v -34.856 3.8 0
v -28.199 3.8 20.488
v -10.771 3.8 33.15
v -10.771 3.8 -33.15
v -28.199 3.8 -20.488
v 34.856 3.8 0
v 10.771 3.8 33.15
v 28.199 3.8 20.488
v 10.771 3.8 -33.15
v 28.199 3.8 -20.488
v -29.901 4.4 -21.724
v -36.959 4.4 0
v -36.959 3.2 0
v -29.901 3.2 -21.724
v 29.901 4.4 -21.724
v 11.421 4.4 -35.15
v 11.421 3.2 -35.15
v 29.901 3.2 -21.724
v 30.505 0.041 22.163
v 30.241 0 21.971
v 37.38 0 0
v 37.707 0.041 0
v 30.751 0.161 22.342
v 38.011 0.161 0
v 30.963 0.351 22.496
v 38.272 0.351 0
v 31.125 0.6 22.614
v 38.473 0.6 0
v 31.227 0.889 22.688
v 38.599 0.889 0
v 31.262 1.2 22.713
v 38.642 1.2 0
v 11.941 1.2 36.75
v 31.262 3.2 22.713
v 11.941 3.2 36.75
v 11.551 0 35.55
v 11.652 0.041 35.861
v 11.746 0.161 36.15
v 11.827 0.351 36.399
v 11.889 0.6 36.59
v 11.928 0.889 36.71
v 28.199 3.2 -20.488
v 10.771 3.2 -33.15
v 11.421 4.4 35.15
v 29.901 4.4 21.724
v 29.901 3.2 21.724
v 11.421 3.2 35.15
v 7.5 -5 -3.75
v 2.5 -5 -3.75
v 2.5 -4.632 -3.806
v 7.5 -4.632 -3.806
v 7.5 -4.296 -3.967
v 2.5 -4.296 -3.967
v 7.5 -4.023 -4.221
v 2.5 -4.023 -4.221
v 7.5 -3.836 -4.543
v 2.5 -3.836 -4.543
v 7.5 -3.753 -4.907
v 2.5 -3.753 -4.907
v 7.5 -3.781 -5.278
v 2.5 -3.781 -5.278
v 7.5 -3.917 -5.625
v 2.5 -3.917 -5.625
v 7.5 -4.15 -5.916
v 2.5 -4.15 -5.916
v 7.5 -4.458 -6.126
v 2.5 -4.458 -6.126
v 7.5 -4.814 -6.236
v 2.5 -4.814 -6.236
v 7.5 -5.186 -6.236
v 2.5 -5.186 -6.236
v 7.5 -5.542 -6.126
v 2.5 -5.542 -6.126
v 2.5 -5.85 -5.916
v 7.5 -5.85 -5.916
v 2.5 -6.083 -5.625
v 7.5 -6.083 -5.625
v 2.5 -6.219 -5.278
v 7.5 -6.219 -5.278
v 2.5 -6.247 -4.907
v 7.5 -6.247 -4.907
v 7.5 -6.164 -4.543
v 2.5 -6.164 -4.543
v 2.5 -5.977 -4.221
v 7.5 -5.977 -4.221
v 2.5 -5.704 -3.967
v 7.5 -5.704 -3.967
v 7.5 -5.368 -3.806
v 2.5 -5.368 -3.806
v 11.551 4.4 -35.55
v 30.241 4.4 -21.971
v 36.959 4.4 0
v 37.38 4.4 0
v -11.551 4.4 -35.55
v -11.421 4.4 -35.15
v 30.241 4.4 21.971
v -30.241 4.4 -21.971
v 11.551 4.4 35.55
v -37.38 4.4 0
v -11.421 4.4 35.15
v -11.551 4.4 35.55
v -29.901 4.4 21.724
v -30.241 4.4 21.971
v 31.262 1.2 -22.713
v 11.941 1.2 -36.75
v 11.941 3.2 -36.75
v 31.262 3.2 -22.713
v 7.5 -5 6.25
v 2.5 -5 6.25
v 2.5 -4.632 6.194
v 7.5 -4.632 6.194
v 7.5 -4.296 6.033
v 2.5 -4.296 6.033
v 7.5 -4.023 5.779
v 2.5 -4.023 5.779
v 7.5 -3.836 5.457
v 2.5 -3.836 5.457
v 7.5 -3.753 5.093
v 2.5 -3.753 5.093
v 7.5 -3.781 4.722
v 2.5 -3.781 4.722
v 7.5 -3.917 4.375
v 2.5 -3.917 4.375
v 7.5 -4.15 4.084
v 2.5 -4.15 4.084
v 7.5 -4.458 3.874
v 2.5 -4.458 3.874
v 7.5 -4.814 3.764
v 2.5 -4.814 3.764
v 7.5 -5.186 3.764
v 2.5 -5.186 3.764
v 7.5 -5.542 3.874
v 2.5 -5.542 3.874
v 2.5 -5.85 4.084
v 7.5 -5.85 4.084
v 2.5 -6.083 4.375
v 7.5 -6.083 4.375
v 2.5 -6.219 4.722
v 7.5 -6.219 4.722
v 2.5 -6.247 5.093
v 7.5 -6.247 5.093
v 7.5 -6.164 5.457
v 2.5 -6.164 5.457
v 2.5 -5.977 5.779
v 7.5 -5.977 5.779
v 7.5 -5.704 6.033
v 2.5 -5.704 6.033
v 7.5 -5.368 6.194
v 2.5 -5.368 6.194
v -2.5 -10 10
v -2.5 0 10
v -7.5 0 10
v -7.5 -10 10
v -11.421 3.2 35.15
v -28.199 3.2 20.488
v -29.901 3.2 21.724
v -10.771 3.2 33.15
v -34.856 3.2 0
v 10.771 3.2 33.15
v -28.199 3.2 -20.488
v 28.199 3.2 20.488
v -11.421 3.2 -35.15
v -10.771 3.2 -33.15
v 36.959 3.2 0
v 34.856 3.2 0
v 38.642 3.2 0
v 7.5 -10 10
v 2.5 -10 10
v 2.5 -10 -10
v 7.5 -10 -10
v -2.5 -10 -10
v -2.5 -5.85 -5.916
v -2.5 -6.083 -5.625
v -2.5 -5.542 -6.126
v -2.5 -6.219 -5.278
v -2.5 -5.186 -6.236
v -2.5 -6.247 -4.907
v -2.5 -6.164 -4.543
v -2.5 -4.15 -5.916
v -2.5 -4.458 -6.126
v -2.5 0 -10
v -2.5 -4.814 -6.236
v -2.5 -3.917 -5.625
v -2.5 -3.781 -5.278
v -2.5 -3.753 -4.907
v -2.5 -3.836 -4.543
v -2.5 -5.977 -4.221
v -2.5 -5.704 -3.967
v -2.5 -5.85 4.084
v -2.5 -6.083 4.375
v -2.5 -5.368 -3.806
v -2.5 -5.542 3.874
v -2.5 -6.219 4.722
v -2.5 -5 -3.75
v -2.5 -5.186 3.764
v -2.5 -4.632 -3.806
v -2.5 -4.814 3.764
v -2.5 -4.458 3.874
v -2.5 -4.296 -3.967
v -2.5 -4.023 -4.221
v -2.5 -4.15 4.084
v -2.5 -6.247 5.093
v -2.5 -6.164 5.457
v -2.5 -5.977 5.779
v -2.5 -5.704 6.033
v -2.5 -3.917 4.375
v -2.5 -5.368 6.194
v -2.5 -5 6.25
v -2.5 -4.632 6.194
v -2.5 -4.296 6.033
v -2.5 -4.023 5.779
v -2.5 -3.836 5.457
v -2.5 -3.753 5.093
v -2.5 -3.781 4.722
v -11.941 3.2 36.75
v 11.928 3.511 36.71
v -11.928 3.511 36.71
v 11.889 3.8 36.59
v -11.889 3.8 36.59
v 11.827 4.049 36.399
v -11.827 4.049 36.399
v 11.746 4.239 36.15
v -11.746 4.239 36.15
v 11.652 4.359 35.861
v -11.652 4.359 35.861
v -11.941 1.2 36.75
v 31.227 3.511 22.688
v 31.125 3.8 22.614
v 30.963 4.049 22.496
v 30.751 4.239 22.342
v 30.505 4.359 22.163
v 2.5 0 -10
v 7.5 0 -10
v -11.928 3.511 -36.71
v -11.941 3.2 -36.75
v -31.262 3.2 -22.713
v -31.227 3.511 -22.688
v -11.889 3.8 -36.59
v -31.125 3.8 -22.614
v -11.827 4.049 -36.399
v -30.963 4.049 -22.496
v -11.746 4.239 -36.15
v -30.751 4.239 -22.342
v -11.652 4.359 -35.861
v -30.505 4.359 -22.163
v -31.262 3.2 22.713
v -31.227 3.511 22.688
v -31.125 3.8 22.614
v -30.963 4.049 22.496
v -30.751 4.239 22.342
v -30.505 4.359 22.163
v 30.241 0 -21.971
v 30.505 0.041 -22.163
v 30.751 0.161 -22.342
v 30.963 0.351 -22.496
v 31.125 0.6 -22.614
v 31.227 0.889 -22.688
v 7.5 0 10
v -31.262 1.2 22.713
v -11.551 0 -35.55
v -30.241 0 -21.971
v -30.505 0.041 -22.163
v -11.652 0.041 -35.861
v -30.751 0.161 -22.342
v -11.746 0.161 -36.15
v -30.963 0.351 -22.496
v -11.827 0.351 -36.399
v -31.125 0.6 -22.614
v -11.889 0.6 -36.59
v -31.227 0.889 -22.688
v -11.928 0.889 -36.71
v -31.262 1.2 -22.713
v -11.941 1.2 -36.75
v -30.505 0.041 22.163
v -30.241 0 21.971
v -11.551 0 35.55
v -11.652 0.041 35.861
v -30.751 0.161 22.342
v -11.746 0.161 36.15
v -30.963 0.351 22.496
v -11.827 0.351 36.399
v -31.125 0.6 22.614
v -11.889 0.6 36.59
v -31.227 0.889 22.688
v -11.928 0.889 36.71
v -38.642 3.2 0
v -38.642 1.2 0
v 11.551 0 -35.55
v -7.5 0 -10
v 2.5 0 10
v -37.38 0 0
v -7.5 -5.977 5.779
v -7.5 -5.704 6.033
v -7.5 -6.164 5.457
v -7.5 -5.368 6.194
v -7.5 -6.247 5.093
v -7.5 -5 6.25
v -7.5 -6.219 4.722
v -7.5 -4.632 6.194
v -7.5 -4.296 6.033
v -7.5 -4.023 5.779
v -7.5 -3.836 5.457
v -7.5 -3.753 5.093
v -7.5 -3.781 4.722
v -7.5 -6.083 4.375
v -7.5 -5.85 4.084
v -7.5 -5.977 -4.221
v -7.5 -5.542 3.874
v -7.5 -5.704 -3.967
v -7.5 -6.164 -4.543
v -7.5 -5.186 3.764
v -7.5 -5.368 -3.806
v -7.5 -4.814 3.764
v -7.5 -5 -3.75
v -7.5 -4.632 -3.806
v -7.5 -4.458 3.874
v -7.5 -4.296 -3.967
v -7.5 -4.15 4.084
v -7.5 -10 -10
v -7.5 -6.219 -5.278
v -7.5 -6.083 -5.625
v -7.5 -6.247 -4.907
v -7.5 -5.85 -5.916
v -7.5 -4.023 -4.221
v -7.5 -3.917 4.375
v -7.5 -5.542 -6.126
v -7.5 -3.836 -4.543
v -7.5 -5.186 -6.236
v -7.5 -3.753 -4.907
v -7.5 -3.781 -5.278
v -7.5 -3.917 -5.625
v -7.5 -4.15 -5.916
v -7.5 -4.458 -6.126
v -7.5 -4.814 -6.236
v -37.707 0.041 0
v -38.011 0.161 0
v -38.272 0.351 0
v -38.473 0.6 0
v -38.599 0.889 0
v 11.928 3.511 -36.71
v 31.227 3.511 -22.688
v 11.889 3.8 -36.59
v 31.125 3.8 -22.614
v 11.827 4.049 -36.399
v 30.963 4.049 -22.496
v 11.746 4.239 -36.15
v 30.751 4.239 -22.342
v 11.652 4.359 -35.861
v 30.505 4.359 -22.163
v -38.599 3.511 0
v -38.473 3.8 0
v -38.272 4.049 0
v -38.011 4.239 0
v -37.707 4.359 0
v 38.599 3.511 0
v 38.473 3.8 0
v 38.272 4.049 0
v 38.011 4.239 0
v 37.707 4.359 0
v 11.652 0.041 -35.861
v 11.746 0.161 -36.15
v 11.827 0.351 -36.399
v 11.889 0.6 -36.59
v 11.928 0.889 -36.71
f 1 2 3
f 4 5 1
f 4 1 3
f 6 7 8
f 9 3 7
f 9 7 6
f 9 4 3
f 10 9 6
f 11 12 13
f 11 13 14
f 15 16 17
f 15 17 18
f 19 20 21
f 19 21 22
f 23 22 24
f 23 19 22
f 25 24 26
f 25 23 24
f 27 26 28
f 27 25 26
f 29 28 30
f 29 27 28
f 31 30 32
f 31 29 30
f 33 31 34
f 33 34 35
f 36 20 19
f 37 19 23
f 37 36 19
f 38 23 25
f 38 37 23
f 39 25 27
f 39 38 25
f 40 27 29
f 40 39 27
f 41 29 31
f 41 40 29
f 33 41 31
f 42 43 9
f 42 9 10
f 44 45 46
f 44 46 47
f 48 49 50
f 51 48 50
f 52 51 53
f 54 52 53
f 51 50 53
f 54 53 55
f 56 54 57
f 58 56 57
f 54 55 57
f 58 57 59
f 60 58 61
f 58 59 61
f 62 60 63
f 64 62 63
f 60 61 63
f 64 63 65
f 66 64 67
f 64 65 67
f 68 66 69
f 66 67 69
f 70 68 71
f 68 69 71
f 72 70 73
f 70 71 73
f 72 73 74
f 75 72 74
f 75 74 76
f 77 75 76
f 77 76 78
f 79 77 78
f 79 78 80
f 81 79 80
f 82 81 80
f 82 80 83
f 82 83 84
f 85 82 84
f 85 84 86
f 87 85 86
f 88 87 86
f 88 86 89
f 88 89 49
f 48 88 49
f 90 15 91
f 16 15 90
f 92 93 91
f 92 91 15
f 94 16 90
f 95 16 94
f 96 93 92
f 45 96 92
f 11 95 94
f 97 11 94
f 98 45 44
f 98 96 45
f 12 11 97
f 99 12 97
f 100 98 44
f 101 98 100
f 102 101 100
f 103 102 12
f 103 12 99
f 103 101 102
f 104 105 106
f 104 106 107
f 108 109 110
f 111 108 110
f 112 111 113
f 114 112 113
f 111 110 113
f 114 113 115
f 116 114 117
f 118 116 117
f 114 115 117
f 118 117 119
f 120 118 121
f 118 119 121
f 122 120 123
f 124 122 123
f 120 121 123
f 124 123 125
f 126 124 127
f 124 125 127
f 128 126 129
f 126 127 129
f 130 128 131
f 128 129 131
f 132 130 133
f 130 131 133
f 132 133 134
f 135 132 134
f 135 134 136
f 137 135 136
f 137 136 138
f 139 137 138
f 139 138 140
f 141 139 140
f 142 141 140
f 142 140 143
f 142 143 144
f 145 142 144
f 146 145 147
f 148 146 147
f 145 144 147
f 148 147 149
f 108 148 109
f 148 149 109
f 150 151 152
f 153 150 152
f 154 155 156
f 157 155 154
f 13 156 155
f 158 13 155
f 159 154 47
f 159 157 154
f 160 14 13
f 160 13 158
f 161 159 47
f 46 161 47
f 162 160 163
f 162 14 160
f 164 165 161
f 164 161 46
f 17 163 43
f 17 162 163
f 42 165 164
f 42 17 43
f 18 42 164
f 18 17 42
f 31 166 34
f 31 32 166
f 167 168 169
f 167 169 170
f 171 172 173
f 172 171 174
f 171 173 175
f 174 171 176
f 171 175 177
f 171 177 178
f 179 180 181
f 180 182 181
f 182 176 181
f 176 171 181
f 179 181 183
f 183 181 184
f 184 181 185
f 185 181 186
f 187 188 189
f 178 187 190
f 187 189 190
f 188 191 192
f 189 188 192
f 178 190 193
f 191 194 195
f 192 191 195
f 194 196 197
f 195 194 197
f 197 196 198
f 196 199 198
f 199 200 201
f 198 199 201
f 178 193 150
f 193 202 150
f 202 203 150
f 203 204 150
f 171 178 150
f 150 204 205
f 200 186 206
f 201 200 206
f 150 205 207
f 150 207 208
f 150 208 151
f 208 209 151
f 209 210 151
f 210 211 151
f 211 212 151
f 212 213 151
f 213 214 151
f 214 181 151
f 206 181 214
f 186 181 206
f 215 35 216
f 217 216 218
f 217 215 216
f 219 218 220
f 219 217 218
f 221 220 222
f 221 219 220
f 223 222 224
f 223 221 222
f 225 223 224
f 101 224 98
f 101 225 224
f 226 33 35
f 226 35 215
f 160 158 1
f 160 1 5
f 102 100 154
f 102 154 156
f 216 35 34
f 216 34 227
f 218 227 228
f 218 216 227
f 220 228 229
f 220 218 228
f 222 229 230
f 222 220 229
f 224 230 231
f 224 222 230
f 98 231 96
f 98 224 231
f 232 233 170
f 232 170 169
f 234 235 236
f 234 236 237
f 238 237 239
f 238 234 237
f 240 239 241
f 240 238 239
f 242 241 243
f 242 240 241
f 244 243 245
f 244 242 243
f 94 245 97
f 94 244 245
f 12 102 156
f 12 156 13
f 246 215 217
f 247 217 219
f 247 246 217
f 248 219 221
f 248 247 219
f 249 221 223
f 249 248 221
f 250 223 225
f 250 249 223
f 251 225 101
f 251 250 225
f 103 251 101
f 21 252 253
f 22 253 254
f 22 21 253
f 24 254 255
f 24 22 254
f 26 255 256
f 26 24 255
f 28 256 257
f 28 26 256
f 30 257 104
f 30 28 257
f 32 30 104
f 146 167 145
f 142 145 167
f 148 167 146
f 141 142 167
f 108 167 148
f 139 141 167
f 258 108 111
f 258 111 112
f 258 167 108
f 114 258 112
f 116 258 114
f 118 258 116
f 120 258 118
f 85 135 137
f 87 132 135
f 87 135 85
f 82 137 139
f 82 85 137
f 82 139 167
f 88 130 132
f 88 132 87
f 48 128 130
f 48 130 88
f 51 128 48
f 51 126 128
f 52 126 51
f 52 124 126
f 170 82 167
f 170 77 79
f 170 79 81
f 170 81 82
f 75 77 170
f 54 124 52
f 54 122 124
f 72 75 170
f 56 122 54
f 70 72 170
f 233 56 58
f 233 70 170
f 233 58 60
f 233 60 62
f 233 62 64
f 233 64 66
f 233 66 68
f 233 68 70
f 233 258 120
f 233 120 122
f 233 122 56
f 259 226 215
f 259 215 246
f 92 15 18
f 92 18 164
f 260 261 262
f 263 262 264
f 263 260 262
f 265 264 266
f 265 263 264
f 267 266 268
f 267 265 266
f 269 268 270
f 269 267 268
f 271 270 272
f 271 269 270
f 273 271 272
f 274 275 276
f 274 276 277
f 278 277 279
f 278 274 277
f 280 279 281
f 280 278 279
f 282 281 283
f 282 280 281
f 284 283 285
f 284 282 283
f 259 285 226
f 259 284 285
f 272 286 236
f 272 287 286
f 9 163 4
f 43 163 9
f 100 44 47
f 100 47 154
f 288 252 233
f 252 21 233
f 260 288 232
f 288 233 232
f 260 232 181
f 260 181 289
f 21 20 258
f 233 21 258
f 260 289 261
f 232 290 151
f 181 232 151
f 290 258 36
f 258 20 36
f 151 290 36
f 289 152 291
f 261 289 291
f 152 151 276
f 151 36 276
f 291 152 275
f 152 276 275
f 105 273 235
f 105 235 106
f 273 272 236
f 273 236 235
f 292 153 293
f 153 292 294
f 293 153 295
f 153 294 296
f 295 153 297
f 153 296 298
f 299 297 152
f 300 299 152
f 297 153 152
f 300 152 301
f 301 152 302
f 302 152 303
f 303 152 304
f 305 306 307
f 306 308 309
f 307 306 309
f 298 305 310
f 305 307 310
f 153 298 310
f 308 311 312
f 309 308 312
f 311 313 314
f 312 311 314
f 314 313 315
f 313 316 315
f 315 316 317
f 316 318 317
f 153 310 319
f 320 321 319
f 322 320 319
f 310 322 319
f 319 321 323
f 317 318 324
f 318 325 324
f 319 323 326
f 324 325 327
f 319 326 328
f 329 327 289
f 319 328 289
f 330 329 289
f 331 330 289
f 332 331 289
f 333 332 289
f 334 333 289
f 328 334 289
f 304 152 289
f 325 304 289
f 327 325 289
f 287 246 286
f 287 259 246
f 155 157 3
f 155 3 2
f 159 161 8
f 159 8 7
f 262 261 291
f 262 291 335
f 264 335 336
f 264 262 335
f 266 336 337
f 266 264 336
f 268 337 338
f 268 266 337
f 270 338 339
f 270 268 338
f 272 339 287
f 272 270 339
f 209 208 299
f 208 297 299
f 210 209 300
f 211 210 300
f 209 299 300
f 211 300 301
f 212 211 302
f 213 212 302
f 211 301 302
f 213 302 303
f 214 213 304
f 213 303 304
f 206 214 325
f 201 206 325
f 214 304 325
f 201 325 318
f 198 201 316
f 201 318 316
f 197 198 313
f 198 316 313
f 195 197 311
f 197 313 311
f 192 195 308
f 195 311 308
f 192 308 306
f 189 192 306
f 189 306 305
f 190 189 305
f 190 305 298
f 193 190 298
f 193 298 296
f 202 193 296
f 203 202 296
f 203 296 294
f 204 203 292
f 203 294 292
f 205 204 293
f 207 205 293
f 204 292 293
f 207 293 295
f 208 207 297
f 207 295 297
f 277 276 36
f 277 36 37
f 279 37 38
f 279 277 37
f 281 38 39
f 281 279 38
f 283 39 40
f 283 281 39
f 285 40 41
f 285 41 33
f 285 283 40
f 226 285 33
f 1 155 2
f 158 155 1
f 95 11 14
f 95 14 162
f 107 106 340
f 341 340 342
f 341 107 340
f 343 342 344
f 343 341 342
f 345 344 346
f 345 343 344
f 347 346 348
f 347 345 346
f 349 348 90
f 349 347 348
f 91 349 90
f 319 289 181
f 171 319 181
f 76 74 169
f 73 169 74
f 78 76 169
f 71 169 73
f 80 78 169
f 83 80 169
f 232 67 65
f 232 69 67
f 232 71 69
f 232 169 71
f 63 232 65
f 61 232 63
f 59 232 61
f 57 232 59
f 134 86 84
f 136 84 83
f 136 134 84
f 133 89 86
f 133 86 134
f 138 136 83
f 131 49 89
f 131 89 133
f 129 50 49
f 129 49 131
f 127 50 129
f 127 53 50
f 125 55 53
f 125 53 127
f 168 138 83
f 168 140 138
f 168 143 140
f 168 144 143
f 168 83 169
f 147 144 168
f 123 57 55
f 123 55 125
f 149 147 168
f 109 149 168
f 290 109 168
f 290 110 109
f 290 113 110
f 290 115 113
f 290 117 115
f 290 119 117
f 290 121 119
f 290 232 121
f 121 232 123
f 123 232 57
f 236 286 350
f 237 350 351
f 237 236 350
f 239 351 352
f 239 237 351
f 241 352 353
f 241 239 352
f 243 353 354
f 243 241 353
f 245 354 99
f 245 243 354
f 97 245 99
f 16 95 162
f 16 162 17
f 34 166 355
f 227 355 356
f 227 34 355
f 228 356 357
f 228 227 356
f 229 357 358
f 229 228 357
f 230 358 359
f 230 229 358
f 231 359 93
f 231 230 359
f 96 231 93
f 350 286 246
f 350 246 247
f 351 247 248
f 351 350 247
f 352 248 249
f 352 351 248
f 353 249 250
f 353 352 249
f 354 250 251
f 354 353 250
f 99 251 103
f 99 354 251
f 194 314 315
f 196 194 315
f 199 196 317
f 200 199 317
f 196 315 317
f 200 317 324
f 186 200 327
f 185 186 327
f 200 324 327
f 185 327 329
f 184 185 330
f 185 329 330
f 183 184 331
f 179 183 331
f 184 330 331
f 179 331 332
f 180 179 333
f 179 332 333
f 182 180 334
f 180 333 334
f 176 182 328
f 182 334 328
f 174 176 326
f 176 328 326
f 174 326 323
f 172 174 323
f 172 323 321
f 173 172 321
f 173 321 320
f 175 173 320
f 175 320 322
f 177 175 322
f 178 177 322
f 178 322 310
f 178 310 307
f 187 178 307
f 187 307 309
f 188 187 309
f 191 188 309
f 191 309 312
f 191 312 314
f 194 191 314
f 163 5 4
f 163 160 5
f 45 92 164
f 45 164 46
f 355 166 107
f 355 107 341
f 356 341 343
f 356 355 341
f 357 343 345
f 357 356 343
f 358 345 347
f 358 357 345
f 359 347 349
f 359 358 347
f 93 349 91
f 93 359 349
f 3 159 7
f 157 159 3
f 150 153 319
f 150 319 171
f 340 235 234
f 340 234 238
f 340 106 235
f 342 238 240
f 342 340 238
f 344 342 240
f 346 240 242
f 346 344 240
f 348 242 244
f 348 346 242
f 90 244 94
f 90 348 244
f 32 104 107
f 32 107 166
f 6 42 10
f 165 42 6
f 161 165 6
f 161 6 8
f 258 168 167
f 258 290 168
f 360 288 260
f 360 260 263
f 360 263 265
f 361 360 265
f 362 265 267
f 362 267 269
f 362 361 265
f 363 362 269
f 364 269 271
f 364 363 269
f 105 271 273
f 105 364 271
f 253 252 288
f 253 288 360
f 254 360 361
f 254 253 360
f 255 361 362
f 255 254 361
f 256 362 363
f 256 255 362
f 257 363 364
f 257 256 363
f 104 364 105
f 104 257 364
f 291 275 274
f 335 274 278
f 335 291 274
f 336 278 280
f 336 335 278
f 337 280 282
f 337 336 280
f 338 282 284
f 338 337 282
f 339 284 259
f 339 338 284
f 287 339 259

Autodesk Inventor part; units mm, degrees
ref_plane "YZ Plane" through (0, 0, 0) normal (1, 0, 0) x (0, 1, 0)
ref_plane "XZ Plane" through (0, 0, 0) normal (0, 1, 0) x (-1, 0, 0)
ref_plane "XY Plane" through (0, 0, 0) normal (0, 0, 1) x (1, 0, 0)
sketch "스케치1" plane through (0, 0, 0) normal (0, 1, 0) x (-1, 0, 0)
  line L0 (-10.9012, 33.5504) -> (10.9012, 33.5504)
  line L1 (10.9012, 33.5504) -> (28.5397, 20.7353)
  line L2 (28.5397, 20.7353) -> (35.277, 0)
  line L3 (35.277, 0) -> (28.5397, -20.7353)
  line L4 (28.5397, -20.7353) -> (10.9012, -33.5504)
  line L5 (10.9012, -33.5504) -> (-10.9012, -33.5504)
  line L6 (-10.9012, -33.5504) -> (-28.5397, -20.7353)
  line L7 (-28.5397, -20.7353) -> (-35.277, 0)
  line L8 (-35.277, 0) -> (-28.5397, 20.7353)
  line L9 (-28.5397, 20.7353) -> (-10.9012, 33.5504)
  line L10 (11.9409, -36.7504) -> (-11.9409, -36.7504)
  line L11 (-11.9409, -36.7504) -> (-31.2618, -22.713)
  line L12 (-31.2618, -22.713) -> (-38.6417, 0)
  line L13 (-38.6417, 0) -> (-31.2618, 22.713)
  line L14 (-31.2618, 22.713) -> (-11.9409, 36.7504)
  line L15 (-11.9409, 36.7504) -> (11.9409, 36.7504)
  line L16 (11.9409, 36.7504) -> (31.2618, 22.713)
  line L17 (31.2618, 22.713) -> (38.6417, 0)
  line L18 (38.6417, 0) -> (31.2618, -22.713)
  line L19 (31.2618, -22.713) -> (11.9409, -36.7504)
  point P0 (0, 0)
  point P1 (0, 0)
  point P2 (0, 0)
  dimension "d0" = 70.554
  dimension "d1" = 3.2
extrude "돌출1" add sketch "스케치1" along normal blind 4.4 contours L0 L1 L2 L3 L4 L5 L6 L7 L8 L9 | L10 L11 L12 L13 L14 L15 L16 L17 L18 L19
sketch "스케치2" plane through (0, 4.4, 0) normal (0, 1, 0) x (1, 0, 0)
  line L0 (-11.4211, 35.1504) -> (11.4211, 35.1504)
  line L1 (11.4211, 35.1504) -> (29.9007, 21.7242)
  line L2 (29.9007, 21.7242) -> (36.9593, 0)
  line L3 (36.9593, 0) -> (29.9007, -21.7242)
  line L4 (29.9007, -21.7242) -> (11.4211, -35.1504)
  line L5 (11.4211, -35.1504) -> (-11.4211, -35.1504)
  line L6 (-11.4211, -35.1504) -> (-29.9007, -21.7242)
  line L7 (-29.9007, -21.7242) -> (-36.9593, 0)
  line L8 (-36.9593, 0) -> (-29.9007, 21.7242)
  line L9 (-29.9007, 21.7242) -> (-11.4211, 35.1504)
  line L10 (-31.2618, 22.713) -> (-38.6417, 0) projected
  point P0 (0, 0)
  point P1 (0, 0)
  dimension "d4" = 1.6
extrude "돌출2" cut sketch "스케치2" against normal blind 1.2
sketch "스케치3" plane through (0, 3.2, 0) normal (0, 1, 0) x (1, 0, 0)
  line L0 (-10.7712, 33.1504) -> (10.7712, 33.1504)
  line L1 (10.7712, 33.1504) -> (28.1994, 20.4881)
  line L2 (28.1994, 20.4881) -> (34.8564, 0)
  line L3 (34.8564, 0) -> (28.1994, -20.4881)
  line L4 (28.1994, -20.4881) -> (10.7712, -33.1504)
  line L5 (10.7712, -33.1504) -> (-10.7712, -33.1504)
  line L6 (-10.7712, -33.1504) -> (-28.1994, -20.4881)
  line L7 (-28.1994, -20.4881) -> (-34.8564, 0)
  line L8 (-34.8564, 0) -> (-28.1994, 20.4881)
  line L9 (-28.1994, 20.4881) -> (-10.7712, 33.1504)
  line L10 (-29.9007, 21.7242) -> (-11.4211, 35.1504) projected
  point P0 (0, 0)
  point P1 (0, 0)
  dimension "d7" = 2
extrude "돌출3" add sketch "스케치3" along normal blind 0.6
fillet "모깎기1" radius 1.2 20 edges at (0, 4.4, 36.7504) (0, 0, 36.7504) (-21.6014, 4.4, 29.7317) (-21.6014, 0, 29.7317) (-34.9517, 4.4, 11.3565) (-34.9517, 4.4, -11.3565) (-21.6014, 4.4, -29.7317) (0, 4.4, -36.7504) (21.6014, 4.4, -29.7317) (34.9517, 4.4, -11.3565) (34.9517, 4.4, 11.3565) (21.6014, 4.4, 29.7317) (21.6014, 0, -29.7317) (0, 0, -36.7504) (-21.6014, 0, -29.7317) (-34.9517, 0, -11.3565) (-34.9517, 0, 11.3565) (34.9517, 0, -11.3565) (34.9517, 0, 11.3565) (21.6014, 0, 29.7317)
sketch "스케치4" plane through (0, 0, 0) normal (0, -1, 0) x (1, 0, 0)
  line L0 (-7.5, -10) -> (-2.5, -10)
  line L1 (-2.5, -10) -> (-2.5, 10)
  line L2 (-2.5, 10) -> (-7.5, 10)
  line L3 (-7.5, 10) -> (-7.5, -10)
  line L4 (-7.5, -10) -> (-2.5, 10) construction
  line L5 (-2.5, -10) -> (-7.5, 10) construction
  line L6 (7.5, -10) -> (2.5, -10)
  line L7 (2.5, -10) -> (2.5, 10)
  line L8 (2.5, 10) -> (7.5, 10)
  line L9 (7.5, 10) -> (7.5, -10)
  line L10 (7.5, -10) -> (2.5, 10) construction
  line L11 (2.5, -10) -> (7.5, 10) construction
  point P0 (0, 0)
  point P1 (-5, 0)
  point P2 (5, 0)
  dimension "d11" = 5
  dimension "d12" = 20
  dimension "d13" = 5
  dimension "d14" = 20
  dimension "d15" = 5
  dimension "d16" = 2.5
extrude "돌출4" add sketch "스케치4" along normal blind 10
sketch "스케치5" plane through (-7.5, 0, -10) normal (-1, 0, 0) x (0, 0, 1)
  circle A0 centre (15, -5) radius 1.25
  circle A1 centre (5, -5) radius 1.25
  line L0 (0, 0) -> (0, -10) projected
  line L1 (-11.9714, 0) -> (10, 0) projected
  dimension "d19" = 2.5
  dimension "d20" = 2.5
  dimension "d21" = 5
  dimension "d22" = 5
  dimension "d23" = 10
extrude "돌출5" cut sketch "스케치5" against normal up to surface (15 mm away)
equation "\"d16\" = 0.5 * d15"
properties part number "OV-PAM_n_10_bottom"
